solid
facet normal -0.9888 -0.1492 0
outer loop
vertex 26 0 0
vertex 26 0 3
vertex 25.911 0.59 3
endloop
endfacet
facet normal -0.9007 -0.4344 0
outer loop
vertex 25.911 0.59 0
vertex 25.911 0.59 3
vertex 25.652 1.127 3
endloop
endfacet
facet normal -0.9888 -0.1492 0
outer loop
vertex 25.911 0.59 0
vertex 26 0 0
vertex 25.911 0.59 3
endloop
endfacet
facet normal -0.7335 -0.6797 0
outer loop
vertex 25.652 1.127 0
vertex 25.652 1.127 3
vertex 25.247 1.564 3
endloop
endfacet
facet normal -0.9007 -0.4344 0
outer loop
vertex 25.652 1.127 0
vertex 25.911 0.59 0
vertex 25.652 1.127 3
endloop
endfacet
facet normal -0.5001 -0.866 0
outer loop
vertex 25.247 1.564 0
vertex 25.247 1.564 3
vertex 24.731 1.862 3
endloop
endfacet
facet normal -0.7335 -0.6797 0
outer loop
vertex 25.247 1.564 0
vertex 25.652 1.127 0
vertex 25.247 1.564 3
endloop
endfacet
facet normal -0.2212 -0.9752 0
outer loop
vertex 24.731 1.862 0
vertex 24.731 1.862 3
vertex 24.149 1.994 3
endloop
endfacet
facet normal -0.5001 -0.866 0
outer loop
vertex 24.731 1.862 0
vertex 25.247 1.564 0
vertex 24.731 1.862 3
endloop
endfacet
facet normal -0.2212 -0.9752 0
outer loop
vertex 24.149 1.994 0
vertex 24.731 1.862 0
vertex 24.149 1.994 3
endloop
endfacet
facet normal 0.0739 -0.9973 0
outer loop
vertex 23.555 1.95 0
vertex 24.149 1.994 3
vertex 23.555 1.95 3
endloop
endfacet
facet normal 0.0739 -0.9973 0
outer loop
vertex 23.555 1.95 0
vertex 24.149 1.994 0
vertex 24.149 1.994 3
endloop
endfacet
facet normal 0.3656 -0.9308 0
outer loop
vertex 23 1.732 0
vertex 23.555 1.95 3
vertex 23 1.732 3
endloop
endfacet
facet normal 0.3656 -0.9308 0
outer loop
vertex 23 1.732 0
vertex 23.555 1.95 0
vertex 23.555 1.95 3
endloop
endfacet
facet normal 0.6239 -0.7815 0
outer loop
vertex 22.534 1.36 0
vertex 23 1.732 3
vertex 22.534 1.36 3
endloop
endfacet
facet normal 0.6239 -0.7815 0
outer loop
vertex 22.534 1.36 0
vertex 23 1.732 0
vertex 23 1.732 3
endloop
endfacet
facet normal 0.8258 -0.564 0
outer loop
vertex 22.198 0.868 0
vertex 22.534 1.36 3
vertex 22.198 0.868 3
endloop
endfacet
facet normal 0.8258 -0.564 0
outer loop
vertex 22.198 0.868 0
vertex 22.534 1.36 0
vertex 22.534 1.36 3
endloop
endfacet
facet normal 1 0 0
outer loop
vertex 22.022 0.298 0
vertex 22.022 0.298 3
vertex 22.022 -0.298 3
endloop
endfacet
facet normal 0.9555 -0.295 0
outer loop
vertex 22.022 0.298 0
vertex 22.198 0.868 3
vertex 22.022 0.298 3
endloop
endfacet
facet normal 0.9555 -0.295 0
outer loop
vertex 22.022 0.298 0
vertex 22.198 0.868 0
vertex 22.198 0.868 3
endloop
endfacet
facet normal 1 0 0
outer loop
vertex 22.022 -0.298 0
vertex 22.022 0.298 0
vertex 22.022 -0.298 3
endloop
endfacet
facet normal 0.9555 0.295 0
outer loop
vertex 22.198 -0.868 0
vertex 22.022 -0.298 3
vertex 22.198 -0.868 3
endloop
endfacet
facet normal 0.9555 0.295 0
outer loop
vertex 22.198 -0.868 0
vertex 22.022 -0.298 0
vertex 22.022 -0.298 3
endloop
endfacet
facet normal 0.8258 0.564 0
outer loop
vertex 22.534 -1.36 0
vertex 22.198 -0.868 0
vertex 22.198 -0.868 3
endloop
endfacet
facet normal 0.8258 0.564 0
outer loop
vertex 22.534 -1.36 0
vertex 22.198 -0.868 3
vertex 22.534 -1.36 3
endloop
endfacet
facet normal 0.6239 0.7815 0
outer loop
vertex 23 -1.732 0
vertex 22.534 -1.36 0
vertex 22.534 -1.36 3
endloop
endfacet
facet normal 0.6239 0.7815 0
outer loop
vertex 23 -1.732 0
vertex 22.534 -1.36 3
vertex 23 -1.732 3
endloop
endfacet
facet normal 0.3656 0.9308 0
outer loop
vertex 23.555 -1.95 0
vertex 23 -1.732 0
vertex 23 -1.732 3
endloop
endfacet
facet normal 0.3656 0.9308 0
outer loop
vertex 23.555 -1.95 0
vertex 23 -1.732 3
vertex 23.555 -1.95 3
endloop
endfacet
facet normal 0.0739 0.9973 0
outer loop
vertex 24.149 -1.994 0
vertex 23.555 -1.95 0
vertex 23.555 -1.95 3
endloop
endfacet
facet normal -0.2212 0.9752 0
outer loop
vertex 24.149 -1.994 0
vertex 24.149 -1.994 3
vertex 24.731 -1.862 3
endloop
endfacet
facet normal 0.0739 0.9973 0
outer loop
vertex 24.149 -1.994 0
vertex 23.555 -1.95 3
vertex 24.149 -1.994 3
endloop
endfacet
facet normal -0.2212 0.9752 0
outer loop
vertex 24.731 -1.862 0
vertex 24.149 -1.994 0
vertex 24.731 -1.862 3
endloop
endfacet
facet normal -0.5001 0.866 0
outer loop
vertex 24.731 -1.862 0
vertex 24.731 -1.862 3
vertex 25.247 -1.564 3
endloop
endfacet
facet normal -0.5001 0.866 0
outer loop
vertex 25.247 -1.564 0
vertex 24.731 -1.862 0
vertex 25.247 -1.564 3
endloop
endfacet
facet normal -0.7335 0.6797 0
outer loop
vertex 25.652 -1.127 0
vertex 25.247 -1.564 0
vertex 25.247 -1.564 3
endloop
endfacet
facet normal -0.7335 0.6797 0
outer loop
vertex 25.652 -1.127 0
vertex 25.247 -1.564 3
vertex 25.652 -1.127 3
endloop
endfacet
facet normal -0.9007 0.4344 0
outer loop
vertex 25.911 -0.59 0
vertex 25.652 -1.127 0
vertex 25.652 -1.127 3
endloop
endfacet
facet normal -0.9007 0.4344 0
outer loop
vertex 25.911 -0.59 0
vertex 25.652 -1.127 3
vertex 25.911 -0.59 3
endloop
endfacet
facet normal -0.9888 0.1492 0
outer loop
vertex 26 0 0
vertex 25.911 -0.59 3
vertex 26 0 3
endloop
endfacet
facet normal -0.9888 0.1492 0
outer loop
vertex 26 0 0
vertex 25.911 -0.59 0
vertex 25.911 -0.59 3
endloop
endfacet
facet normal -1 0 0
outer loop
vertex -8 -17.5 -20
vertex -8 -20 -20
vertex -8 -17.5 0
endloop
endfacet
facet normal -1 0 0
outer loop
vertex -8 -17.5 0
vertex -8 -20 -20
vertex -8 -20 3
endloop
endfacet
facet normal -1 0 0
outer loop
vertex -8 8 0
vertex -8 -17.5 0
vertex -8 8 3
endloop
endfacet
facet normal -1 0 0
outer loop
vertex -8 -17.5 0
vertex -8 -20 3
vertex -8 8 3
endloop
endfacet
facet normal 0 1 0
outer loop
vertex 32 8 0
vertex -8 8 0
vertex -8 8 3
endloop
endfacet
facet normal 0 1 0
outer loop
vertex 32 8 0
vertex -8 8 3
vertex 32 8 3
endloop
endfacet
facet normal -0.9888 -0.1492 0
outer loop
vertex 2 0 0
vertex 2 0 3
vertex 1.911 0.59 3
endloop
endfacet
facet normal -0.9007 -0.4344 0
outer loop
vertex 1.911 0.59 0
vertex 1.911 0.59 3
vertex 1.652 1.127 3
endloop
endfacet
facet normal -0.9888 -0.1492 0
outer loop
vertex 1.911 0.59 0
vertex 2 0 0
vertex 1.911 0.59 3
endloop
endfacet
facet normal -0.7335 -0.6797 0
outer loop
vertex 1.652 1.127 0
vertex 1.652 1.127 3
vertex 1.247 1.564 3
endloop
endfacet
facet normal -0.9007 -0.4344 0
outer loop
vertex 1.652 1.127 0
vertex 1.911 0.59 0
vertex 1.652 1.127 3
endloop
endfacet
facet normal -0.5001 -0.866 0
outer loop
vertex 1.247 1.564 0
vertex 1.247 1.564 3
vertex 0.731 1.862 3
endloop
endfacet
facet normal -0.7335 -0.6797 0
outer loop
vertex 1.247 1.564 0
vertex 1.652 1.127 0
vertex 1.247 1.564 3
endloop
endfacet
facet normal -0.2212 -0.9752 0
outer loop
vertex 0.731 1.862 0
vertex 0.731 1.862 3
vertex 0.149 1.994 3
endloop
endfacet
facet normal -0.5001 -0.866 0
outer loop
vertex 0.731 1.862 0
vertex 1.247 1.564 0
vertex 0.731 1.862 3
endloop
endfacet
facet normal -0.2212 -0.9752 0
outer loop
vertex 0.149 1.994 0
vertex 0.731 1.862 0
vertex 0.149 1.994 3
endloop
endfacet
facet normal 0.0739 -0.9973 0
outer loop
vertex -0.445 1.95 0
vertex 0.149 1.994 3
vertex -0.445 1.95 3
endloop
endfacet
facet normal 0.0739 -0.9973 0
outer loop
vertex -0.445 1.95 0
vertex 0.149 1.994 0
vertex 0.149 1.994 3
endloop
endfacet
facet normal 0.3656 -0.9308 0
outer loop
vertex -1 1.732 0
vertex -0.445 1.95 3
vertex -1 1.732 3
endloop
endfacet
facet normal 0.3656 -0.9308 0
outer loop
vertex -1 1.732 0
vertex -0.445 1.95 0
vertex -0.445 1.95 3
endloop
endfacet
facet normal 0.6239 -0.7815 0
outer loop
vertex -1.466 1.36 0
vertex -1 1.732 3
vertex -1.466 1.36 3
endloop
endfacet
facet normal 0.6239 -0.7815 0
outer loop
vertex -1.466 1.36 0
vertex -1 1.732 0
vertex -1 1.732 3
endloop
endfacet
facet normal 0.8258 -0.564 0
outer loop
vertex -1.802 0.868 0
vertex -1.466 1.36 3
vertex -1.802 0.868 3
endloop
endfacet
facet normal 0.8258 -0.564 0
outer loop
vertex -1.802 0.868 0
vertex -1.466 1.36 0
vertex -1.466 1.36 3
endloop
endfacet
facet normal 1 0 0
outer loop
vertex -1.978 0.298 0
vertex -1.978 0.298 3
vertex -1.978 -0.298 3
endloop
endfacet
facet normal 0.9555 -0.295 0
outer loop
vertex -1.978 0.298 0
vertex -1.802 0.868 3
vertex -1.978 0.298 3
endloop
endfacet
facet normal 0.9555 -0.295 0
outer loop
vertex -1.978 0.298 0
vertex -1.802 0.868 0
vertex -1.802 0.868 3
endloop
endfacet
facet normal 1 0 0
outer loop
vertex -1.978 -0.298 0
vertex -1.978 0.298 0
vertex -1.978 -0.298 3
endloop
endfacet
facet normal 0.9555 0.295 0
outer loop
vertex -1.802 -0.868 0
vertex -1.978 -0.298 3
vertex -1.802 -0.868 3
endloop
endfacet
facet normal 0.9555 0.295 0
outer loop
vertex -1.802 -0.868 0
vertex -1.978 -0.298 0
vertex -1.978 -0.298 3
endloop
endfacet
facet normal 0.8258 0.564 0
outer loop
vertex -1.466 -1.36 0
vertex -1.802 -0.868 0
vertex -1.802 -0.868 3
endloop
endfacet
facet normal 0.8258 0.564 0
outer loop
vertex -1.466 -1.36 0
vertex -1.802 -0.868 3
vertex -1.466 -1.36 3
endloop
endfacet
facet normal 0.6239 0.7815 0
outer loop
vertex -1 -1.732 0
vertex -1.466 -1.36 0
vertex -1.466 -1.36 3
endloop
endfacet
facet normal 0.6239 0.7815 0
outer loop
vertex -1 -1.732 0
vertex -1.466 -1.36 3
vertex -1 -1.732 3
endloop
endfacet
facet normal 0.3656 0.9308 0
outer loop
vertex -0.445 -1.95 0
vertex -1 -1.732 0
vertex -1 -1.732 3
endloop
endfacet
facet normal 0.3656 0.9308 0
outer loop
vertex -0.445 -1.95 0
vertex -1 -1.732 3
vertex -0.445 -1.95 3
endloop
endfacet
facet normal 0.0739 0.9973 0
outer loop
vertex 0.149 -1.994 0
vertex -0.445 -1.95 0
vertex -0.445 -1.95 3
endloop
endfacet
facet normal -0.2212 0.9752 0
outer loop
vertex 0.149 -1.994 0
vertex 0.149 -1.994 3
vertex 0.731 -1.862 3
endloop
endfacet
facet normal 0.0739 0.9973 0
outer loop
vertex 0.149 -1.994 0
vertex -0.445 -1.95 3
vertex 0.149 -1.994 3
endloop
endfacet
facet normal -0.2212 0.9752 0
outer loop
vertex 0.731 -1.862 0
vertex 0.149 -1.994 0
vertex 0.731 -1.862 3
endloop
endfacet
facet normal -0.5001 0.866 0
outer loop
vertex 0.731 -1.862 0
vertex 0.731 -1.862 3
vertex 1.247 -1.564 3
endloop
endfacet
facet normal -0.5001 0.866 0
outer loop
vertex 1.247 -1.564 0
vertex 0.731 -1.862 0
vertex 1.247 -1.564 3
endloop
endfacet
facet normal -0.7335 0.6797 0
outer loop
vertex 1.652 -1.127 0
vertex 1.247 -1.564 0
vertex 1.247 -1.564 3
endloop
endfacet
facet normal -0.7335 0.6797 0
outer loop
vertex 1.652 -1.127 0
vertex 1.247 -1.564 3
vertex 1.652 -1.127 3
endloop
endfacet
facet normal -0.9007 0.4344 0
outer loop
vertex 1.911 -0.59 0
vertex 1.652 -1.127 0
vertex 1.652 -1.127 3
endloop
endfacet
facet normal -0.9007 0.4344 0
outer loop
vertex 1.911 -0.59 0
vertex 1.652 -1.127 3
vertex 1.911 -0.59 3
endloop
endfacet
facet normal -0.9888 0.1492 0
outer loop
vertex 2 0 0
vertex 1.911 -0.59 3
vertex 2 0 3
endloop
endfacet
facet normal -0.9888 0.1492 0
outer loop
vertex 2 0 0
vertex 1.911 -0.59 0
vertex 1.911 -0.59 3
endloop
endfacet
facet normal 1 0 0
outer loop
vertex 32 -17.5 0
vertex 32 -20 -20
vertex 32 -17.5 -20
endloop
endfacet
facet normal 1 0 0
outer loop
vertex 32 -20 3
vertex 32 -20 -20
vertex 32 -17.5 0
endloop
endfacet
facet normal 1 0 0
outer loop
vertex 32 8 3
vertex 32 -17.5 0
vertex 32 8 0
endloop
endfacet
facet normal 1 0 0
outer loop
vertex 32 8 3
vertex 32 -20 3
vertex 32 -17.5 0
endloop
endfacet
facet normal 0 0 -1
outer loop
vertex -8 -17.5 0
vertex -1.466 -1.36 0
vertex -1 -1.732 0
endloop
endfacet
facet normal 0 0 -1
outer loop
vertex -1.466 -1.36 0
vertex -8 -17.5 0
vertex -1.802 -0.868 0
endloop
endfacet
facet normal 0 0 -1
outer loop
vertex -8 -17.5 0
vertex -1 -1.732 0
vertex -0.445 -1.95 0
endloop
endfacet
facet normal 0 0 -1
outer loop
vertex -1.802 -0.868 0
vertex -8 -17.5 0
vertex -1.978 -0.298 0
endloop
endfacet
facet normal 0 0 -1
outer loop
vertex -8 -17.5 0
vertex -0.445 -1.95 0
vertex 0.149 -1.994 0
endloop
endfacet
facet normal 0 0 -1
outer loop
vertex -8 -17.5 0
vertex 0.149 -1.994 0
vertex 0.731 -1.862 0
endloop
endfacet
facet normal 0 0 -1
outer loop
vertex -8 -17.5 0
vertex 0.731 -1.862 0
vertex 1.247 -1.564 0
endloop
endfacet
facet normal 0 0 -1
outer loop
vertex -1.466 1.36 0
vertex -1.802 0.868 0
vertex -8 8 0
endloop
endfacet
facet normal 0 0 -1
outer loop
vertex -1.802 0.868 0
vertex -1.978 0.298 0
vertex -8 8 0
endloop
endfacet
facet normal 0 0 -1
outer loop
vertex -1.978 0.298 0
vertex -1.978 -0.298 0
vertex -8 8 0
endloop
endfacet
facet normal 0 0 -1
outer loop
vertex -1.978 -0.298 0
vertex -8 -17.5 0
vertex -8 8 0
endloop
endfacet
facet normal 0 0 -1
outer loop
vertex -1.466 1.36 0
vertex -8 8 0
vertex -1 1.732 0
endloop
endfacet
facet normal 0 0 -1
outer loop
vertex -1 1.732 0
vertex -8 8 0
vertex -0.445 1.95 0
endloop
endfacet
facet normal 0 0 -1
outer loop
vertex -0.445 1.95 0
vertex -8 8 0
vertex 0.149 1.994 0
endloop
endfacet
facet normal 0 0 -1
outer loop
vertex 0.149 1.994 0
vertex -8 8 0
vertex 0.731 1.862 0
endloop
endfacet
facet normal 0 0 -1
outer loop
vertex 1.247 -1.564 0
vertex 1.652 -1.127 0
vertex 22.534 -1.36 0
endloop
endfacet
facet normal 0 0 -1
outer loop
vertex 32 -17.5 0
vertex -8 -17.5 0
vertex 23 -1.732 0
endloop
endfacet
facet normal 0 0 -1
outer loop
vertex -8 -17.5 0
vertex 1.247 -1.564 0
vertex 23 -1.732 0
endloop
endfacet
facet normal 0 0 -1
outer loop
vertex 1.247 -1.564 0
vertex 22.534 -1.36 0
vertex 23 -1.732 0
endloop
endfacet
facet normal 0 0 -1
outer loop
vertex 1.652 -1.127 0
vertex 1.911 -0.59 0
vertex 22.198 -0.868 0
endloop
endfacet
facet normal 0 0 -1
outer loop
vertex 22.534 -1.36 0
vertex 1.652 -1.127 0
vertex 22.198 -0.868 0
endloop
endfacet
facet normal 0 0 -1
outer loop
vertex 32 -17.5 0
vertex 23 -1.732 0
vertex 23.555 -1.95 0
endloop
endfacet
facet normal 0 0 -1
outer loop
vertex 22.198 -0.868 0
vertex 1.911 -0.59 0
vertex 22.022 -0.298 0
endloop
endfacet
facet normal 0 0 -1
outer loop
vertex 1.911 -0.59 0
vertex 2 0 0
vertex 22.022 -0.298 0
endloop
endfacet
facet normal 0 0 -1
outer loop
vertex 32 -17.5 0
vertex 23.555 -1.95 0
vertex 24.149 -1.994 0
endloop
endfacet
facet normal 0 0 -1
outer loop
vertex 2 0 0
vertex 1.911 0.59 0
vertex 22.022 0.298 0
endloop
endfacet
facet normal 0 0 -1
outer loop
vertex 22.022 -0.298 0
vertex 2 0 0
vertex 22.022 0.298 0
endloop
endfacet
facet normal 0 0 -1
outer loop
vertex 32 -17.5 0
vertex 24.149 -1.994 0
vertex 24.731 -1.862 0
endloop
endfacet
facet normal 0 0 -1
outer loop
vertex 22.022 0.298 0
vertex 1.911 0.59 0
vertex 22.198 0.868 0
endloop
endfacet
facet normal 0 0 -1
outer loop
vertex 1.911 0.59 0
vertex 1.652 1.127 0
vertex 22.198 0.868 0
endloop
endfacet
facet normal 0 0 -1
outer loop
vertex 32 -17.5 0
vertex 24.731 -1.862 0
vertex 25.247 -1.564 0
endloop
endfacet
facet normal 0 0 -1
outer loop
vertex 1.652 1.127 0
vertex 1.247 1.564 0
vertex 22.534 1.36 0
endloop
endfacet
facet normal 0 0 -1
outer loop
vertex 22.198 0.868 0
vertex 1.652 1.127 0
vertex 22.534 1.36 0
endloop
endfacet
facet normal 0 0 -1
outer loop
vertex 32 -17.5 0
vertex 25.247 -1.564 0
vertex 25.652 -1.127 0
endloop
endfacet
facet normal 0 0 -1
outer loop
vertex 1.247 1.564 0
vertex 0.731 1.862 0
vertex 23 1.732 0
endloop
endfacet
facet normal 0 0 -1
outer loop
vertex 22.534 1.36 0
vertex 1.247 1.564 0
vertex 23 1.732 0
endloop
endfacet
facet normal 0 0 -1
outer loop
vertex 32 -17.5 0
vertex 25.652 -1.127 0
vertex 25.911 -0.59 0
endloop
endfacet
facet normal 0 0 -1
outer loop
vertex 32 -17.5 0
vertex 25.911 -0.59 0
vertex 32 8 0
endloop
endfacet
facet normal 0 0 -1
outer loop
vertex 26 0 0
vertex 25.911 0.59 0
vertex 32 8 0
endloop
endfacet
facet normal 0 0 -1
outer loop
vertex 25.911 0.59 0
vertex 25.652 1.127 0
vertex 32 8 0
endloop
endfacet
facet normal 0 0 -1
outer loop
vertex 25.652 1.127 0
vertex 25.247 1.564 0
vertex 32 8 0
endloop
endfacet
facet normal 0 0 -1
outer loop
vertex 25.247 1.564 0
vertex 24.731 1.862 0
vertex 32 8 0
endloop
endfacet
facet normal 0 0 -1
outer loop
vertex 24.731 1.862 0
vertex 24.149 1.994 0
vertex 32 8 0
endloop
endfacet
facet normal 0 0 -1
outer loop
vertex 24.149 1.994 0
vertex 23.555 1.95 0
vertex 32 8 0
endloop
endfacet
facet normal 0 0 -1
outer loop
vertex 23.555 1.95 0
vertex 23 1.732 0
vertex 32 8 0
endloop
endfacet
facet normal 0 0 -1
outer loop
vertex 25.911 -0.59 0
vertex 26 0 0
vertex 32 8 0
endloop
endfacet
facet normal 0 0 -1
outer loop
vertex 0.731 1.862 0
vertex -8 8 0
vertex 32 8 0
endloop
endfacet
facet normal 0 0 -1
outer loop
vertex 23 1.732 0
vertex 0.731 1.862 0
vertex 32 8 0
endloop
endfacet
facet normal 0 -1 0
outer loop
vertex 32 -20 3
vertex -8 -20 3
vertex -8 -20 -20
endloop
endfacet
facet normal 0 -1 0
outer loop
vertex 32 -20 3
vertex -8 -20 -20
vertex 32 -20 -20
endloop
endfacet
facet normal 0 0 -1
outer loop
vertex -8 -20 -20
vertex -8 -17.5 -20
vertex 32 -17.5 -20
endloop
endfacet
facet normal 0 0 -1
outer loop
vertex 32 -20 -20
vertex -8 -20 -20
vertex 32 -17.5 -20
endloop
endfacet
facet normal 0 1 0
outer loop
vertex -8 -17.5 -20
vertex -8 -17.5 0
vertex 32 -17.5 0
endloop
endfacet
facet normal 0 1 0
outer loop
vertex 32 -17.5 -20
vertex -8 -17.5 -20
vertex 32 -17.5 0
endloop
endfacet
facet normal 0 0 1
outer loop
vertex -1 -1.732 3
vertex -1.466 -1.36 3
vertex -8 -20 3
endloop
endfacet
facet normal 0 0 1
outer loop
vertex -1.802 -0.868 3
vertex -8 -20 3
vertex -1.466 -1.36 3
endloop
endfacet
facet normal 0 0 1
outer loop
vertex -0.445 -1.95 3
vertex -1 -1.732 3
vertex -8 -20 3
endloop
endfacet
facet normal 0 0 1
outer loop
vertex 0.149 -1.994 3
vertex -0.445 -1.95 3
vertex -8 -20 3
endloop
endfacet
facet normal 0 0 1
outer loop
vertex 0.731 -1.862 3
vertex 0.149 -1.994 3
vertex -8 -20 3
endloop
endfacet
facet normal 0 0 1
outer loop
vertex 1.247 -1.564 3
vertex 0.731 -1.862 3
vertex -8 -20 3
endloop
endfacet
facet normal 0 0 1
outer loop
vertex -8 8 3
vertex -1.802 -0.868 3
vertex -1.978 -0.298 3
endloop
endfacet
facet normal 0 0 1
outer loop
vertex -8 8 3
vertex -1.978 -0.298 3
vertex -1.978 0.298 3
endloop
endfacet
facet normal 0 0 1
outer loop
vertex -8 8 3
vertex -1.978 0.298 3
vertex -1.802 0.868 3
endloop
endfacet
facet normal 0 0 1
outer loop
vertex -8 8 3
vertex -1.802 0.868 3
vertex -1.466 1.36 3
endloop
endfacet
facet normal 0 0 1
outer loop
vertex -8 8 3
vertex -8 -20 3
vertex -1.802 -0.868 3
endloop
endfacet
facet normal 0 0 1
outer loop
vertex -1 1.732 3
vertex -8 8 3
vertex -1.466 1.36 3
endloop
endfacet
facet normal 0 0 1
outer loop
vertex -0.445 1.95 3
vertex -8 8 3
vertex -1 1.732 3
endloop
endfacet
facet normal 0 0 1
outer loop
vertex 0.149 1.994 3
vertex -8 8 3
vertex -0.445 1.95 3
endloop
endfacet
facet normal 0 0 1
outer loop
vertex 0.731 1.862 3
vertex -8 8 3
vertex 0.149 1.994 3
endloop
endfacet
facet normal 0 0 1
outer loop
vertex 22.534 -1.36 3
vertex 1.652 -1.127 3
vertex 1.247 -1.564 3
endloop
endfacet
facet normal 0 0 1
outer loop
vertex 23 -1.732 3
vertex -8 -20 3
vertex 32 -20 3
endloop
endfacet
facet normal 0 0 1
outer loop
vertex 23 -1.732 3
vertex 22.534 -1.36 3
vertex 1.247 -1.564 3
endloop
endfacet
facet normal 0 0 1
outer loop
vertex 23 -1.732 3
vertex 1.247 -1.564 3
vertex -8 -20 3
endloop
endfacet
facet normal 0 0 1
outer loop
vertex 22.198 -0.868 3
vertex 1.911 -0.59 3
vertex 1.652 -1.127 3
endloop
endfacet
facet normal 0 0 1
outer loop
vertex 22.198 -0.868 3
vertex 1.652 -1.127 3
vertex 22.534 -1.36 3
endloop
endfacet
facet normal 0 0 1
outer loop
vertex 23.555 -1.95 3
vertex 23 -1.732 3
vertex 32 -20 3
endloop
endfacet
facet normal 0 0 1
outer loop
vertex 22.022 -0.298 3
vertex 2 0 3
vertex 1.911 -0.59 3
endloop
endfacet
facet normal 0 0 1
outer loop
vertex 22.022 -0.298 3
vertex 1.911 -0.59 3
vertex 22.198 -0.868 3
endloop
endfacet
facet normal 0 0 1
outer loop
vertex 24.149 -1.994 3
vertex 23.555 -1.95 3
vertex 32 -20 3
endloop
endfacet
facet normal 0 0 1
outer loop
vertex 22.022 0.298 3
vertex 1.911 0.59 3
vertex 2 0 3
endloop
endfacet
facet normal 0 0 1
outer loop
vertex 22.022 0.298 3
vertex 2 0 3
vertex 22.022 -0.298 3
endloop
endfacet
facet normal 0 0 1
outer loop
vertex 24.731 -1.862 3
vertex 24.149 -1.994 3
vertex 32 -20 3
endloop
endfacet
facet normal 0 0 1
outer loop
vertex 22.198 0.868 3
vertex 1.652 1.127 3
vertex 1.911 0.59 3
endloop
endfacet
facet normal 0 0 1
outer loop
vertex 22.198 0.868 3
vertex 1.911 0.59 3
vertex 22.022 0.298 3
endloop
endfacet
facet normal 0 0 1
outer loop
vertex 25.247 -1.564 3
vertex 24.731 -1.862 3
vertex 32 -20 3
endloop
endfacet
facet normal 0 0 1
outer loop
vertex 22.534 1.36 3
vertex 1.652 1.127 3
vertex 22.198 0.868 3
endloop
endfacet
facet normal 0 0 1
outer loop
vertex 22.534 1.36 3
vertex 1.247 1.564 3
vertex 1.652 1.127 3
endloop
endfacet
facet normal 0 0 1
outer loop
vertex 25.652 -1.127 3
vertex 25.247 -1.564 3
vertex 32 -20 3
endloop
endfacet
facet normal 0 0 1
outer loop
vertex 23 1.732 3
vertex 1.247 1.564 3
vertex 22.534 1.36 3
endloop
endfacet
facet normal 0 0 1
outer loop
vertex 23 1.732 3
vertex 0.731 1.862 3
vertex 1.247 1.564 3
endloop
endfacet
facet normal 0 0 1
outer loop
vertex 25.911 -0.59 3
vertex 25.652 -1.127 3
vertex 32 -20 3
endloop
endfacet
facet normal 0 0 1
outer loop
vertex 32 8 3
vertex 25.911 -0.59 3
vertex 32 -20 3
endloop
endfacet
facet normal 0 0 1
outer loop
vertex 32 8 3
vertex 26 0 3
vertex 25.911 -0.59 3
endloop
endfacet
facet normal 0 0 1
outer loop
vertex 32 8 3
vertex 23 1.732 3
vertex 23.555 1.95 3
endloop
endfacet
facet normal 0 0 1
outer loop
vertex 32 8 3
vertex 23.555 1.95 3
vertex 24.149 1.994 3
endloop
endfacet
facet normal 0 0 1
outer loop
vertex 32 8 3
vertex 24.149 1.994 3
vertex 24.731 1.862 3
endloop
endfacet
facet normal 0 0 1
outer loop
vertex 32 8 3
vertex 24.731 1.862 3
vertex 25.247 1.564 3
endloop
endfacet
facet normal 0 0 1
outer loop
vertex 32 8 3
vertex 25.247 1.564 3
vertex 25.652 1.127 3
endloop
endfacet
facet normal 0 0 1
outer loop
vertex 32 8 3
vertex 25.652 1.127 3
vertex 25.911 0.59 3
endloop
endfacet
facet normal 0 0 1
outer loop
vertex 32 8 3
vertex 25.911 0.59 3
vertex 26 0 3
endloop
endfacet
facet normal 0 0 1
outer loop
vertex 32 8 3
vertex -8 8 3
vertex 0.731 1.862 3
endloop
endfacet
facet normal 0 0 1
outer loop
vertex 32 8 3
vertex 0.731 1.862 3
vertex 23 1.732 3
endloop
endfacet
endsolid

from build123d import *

# Parameters (mm, degrees)
SKETCH002_W     = 40
SKETCH002_H     = 28
PAD_DEPTH       = 3
SKETCH_R        = 2
POCKET_DEPTH    = 5
SKETCH001_R     = 2
POCKET001_DEPTH = 5
SKETCH003_W     = 40
SKETCH003_H     = 2.5
PAD001_DEPTH    = 20


with BuildPart() as part:
    # Sketch002 → Pad (new body)
    with BuildSketch(Plane.XY):
        with Locations((12, -6)):
            Rectangle(SKETCH002_W, SKETCH002_H)
    extrude(amount=PAD_DEPTH)

    # Sketch → Pocket (cut)
    with BuildSketch(Plane.XY):
        Circle(SKETCH_R)
    extrude(amount=POCKET_DEPTH, mode=Mode.SUBTRACT)

    # Sketch001 → Pocket001 (cut)
    with BuildSketch(Plane.XY):
        with Locations((24, 0)):
            Circle(SKETCH001_R)
    extrude(amount=POCKET001_DEPTH, mode=Mode.SUBTRACT)

    # Sketch003 → Pad001 (join)
    with BuildSketch(Plane.XY):
        with Locations((12, -18.75)):
            Rectangle(SKETCH003_W, SKETCH003_H)
    extrude(amount=-PAD001_DEPTH)


solid = part.part
